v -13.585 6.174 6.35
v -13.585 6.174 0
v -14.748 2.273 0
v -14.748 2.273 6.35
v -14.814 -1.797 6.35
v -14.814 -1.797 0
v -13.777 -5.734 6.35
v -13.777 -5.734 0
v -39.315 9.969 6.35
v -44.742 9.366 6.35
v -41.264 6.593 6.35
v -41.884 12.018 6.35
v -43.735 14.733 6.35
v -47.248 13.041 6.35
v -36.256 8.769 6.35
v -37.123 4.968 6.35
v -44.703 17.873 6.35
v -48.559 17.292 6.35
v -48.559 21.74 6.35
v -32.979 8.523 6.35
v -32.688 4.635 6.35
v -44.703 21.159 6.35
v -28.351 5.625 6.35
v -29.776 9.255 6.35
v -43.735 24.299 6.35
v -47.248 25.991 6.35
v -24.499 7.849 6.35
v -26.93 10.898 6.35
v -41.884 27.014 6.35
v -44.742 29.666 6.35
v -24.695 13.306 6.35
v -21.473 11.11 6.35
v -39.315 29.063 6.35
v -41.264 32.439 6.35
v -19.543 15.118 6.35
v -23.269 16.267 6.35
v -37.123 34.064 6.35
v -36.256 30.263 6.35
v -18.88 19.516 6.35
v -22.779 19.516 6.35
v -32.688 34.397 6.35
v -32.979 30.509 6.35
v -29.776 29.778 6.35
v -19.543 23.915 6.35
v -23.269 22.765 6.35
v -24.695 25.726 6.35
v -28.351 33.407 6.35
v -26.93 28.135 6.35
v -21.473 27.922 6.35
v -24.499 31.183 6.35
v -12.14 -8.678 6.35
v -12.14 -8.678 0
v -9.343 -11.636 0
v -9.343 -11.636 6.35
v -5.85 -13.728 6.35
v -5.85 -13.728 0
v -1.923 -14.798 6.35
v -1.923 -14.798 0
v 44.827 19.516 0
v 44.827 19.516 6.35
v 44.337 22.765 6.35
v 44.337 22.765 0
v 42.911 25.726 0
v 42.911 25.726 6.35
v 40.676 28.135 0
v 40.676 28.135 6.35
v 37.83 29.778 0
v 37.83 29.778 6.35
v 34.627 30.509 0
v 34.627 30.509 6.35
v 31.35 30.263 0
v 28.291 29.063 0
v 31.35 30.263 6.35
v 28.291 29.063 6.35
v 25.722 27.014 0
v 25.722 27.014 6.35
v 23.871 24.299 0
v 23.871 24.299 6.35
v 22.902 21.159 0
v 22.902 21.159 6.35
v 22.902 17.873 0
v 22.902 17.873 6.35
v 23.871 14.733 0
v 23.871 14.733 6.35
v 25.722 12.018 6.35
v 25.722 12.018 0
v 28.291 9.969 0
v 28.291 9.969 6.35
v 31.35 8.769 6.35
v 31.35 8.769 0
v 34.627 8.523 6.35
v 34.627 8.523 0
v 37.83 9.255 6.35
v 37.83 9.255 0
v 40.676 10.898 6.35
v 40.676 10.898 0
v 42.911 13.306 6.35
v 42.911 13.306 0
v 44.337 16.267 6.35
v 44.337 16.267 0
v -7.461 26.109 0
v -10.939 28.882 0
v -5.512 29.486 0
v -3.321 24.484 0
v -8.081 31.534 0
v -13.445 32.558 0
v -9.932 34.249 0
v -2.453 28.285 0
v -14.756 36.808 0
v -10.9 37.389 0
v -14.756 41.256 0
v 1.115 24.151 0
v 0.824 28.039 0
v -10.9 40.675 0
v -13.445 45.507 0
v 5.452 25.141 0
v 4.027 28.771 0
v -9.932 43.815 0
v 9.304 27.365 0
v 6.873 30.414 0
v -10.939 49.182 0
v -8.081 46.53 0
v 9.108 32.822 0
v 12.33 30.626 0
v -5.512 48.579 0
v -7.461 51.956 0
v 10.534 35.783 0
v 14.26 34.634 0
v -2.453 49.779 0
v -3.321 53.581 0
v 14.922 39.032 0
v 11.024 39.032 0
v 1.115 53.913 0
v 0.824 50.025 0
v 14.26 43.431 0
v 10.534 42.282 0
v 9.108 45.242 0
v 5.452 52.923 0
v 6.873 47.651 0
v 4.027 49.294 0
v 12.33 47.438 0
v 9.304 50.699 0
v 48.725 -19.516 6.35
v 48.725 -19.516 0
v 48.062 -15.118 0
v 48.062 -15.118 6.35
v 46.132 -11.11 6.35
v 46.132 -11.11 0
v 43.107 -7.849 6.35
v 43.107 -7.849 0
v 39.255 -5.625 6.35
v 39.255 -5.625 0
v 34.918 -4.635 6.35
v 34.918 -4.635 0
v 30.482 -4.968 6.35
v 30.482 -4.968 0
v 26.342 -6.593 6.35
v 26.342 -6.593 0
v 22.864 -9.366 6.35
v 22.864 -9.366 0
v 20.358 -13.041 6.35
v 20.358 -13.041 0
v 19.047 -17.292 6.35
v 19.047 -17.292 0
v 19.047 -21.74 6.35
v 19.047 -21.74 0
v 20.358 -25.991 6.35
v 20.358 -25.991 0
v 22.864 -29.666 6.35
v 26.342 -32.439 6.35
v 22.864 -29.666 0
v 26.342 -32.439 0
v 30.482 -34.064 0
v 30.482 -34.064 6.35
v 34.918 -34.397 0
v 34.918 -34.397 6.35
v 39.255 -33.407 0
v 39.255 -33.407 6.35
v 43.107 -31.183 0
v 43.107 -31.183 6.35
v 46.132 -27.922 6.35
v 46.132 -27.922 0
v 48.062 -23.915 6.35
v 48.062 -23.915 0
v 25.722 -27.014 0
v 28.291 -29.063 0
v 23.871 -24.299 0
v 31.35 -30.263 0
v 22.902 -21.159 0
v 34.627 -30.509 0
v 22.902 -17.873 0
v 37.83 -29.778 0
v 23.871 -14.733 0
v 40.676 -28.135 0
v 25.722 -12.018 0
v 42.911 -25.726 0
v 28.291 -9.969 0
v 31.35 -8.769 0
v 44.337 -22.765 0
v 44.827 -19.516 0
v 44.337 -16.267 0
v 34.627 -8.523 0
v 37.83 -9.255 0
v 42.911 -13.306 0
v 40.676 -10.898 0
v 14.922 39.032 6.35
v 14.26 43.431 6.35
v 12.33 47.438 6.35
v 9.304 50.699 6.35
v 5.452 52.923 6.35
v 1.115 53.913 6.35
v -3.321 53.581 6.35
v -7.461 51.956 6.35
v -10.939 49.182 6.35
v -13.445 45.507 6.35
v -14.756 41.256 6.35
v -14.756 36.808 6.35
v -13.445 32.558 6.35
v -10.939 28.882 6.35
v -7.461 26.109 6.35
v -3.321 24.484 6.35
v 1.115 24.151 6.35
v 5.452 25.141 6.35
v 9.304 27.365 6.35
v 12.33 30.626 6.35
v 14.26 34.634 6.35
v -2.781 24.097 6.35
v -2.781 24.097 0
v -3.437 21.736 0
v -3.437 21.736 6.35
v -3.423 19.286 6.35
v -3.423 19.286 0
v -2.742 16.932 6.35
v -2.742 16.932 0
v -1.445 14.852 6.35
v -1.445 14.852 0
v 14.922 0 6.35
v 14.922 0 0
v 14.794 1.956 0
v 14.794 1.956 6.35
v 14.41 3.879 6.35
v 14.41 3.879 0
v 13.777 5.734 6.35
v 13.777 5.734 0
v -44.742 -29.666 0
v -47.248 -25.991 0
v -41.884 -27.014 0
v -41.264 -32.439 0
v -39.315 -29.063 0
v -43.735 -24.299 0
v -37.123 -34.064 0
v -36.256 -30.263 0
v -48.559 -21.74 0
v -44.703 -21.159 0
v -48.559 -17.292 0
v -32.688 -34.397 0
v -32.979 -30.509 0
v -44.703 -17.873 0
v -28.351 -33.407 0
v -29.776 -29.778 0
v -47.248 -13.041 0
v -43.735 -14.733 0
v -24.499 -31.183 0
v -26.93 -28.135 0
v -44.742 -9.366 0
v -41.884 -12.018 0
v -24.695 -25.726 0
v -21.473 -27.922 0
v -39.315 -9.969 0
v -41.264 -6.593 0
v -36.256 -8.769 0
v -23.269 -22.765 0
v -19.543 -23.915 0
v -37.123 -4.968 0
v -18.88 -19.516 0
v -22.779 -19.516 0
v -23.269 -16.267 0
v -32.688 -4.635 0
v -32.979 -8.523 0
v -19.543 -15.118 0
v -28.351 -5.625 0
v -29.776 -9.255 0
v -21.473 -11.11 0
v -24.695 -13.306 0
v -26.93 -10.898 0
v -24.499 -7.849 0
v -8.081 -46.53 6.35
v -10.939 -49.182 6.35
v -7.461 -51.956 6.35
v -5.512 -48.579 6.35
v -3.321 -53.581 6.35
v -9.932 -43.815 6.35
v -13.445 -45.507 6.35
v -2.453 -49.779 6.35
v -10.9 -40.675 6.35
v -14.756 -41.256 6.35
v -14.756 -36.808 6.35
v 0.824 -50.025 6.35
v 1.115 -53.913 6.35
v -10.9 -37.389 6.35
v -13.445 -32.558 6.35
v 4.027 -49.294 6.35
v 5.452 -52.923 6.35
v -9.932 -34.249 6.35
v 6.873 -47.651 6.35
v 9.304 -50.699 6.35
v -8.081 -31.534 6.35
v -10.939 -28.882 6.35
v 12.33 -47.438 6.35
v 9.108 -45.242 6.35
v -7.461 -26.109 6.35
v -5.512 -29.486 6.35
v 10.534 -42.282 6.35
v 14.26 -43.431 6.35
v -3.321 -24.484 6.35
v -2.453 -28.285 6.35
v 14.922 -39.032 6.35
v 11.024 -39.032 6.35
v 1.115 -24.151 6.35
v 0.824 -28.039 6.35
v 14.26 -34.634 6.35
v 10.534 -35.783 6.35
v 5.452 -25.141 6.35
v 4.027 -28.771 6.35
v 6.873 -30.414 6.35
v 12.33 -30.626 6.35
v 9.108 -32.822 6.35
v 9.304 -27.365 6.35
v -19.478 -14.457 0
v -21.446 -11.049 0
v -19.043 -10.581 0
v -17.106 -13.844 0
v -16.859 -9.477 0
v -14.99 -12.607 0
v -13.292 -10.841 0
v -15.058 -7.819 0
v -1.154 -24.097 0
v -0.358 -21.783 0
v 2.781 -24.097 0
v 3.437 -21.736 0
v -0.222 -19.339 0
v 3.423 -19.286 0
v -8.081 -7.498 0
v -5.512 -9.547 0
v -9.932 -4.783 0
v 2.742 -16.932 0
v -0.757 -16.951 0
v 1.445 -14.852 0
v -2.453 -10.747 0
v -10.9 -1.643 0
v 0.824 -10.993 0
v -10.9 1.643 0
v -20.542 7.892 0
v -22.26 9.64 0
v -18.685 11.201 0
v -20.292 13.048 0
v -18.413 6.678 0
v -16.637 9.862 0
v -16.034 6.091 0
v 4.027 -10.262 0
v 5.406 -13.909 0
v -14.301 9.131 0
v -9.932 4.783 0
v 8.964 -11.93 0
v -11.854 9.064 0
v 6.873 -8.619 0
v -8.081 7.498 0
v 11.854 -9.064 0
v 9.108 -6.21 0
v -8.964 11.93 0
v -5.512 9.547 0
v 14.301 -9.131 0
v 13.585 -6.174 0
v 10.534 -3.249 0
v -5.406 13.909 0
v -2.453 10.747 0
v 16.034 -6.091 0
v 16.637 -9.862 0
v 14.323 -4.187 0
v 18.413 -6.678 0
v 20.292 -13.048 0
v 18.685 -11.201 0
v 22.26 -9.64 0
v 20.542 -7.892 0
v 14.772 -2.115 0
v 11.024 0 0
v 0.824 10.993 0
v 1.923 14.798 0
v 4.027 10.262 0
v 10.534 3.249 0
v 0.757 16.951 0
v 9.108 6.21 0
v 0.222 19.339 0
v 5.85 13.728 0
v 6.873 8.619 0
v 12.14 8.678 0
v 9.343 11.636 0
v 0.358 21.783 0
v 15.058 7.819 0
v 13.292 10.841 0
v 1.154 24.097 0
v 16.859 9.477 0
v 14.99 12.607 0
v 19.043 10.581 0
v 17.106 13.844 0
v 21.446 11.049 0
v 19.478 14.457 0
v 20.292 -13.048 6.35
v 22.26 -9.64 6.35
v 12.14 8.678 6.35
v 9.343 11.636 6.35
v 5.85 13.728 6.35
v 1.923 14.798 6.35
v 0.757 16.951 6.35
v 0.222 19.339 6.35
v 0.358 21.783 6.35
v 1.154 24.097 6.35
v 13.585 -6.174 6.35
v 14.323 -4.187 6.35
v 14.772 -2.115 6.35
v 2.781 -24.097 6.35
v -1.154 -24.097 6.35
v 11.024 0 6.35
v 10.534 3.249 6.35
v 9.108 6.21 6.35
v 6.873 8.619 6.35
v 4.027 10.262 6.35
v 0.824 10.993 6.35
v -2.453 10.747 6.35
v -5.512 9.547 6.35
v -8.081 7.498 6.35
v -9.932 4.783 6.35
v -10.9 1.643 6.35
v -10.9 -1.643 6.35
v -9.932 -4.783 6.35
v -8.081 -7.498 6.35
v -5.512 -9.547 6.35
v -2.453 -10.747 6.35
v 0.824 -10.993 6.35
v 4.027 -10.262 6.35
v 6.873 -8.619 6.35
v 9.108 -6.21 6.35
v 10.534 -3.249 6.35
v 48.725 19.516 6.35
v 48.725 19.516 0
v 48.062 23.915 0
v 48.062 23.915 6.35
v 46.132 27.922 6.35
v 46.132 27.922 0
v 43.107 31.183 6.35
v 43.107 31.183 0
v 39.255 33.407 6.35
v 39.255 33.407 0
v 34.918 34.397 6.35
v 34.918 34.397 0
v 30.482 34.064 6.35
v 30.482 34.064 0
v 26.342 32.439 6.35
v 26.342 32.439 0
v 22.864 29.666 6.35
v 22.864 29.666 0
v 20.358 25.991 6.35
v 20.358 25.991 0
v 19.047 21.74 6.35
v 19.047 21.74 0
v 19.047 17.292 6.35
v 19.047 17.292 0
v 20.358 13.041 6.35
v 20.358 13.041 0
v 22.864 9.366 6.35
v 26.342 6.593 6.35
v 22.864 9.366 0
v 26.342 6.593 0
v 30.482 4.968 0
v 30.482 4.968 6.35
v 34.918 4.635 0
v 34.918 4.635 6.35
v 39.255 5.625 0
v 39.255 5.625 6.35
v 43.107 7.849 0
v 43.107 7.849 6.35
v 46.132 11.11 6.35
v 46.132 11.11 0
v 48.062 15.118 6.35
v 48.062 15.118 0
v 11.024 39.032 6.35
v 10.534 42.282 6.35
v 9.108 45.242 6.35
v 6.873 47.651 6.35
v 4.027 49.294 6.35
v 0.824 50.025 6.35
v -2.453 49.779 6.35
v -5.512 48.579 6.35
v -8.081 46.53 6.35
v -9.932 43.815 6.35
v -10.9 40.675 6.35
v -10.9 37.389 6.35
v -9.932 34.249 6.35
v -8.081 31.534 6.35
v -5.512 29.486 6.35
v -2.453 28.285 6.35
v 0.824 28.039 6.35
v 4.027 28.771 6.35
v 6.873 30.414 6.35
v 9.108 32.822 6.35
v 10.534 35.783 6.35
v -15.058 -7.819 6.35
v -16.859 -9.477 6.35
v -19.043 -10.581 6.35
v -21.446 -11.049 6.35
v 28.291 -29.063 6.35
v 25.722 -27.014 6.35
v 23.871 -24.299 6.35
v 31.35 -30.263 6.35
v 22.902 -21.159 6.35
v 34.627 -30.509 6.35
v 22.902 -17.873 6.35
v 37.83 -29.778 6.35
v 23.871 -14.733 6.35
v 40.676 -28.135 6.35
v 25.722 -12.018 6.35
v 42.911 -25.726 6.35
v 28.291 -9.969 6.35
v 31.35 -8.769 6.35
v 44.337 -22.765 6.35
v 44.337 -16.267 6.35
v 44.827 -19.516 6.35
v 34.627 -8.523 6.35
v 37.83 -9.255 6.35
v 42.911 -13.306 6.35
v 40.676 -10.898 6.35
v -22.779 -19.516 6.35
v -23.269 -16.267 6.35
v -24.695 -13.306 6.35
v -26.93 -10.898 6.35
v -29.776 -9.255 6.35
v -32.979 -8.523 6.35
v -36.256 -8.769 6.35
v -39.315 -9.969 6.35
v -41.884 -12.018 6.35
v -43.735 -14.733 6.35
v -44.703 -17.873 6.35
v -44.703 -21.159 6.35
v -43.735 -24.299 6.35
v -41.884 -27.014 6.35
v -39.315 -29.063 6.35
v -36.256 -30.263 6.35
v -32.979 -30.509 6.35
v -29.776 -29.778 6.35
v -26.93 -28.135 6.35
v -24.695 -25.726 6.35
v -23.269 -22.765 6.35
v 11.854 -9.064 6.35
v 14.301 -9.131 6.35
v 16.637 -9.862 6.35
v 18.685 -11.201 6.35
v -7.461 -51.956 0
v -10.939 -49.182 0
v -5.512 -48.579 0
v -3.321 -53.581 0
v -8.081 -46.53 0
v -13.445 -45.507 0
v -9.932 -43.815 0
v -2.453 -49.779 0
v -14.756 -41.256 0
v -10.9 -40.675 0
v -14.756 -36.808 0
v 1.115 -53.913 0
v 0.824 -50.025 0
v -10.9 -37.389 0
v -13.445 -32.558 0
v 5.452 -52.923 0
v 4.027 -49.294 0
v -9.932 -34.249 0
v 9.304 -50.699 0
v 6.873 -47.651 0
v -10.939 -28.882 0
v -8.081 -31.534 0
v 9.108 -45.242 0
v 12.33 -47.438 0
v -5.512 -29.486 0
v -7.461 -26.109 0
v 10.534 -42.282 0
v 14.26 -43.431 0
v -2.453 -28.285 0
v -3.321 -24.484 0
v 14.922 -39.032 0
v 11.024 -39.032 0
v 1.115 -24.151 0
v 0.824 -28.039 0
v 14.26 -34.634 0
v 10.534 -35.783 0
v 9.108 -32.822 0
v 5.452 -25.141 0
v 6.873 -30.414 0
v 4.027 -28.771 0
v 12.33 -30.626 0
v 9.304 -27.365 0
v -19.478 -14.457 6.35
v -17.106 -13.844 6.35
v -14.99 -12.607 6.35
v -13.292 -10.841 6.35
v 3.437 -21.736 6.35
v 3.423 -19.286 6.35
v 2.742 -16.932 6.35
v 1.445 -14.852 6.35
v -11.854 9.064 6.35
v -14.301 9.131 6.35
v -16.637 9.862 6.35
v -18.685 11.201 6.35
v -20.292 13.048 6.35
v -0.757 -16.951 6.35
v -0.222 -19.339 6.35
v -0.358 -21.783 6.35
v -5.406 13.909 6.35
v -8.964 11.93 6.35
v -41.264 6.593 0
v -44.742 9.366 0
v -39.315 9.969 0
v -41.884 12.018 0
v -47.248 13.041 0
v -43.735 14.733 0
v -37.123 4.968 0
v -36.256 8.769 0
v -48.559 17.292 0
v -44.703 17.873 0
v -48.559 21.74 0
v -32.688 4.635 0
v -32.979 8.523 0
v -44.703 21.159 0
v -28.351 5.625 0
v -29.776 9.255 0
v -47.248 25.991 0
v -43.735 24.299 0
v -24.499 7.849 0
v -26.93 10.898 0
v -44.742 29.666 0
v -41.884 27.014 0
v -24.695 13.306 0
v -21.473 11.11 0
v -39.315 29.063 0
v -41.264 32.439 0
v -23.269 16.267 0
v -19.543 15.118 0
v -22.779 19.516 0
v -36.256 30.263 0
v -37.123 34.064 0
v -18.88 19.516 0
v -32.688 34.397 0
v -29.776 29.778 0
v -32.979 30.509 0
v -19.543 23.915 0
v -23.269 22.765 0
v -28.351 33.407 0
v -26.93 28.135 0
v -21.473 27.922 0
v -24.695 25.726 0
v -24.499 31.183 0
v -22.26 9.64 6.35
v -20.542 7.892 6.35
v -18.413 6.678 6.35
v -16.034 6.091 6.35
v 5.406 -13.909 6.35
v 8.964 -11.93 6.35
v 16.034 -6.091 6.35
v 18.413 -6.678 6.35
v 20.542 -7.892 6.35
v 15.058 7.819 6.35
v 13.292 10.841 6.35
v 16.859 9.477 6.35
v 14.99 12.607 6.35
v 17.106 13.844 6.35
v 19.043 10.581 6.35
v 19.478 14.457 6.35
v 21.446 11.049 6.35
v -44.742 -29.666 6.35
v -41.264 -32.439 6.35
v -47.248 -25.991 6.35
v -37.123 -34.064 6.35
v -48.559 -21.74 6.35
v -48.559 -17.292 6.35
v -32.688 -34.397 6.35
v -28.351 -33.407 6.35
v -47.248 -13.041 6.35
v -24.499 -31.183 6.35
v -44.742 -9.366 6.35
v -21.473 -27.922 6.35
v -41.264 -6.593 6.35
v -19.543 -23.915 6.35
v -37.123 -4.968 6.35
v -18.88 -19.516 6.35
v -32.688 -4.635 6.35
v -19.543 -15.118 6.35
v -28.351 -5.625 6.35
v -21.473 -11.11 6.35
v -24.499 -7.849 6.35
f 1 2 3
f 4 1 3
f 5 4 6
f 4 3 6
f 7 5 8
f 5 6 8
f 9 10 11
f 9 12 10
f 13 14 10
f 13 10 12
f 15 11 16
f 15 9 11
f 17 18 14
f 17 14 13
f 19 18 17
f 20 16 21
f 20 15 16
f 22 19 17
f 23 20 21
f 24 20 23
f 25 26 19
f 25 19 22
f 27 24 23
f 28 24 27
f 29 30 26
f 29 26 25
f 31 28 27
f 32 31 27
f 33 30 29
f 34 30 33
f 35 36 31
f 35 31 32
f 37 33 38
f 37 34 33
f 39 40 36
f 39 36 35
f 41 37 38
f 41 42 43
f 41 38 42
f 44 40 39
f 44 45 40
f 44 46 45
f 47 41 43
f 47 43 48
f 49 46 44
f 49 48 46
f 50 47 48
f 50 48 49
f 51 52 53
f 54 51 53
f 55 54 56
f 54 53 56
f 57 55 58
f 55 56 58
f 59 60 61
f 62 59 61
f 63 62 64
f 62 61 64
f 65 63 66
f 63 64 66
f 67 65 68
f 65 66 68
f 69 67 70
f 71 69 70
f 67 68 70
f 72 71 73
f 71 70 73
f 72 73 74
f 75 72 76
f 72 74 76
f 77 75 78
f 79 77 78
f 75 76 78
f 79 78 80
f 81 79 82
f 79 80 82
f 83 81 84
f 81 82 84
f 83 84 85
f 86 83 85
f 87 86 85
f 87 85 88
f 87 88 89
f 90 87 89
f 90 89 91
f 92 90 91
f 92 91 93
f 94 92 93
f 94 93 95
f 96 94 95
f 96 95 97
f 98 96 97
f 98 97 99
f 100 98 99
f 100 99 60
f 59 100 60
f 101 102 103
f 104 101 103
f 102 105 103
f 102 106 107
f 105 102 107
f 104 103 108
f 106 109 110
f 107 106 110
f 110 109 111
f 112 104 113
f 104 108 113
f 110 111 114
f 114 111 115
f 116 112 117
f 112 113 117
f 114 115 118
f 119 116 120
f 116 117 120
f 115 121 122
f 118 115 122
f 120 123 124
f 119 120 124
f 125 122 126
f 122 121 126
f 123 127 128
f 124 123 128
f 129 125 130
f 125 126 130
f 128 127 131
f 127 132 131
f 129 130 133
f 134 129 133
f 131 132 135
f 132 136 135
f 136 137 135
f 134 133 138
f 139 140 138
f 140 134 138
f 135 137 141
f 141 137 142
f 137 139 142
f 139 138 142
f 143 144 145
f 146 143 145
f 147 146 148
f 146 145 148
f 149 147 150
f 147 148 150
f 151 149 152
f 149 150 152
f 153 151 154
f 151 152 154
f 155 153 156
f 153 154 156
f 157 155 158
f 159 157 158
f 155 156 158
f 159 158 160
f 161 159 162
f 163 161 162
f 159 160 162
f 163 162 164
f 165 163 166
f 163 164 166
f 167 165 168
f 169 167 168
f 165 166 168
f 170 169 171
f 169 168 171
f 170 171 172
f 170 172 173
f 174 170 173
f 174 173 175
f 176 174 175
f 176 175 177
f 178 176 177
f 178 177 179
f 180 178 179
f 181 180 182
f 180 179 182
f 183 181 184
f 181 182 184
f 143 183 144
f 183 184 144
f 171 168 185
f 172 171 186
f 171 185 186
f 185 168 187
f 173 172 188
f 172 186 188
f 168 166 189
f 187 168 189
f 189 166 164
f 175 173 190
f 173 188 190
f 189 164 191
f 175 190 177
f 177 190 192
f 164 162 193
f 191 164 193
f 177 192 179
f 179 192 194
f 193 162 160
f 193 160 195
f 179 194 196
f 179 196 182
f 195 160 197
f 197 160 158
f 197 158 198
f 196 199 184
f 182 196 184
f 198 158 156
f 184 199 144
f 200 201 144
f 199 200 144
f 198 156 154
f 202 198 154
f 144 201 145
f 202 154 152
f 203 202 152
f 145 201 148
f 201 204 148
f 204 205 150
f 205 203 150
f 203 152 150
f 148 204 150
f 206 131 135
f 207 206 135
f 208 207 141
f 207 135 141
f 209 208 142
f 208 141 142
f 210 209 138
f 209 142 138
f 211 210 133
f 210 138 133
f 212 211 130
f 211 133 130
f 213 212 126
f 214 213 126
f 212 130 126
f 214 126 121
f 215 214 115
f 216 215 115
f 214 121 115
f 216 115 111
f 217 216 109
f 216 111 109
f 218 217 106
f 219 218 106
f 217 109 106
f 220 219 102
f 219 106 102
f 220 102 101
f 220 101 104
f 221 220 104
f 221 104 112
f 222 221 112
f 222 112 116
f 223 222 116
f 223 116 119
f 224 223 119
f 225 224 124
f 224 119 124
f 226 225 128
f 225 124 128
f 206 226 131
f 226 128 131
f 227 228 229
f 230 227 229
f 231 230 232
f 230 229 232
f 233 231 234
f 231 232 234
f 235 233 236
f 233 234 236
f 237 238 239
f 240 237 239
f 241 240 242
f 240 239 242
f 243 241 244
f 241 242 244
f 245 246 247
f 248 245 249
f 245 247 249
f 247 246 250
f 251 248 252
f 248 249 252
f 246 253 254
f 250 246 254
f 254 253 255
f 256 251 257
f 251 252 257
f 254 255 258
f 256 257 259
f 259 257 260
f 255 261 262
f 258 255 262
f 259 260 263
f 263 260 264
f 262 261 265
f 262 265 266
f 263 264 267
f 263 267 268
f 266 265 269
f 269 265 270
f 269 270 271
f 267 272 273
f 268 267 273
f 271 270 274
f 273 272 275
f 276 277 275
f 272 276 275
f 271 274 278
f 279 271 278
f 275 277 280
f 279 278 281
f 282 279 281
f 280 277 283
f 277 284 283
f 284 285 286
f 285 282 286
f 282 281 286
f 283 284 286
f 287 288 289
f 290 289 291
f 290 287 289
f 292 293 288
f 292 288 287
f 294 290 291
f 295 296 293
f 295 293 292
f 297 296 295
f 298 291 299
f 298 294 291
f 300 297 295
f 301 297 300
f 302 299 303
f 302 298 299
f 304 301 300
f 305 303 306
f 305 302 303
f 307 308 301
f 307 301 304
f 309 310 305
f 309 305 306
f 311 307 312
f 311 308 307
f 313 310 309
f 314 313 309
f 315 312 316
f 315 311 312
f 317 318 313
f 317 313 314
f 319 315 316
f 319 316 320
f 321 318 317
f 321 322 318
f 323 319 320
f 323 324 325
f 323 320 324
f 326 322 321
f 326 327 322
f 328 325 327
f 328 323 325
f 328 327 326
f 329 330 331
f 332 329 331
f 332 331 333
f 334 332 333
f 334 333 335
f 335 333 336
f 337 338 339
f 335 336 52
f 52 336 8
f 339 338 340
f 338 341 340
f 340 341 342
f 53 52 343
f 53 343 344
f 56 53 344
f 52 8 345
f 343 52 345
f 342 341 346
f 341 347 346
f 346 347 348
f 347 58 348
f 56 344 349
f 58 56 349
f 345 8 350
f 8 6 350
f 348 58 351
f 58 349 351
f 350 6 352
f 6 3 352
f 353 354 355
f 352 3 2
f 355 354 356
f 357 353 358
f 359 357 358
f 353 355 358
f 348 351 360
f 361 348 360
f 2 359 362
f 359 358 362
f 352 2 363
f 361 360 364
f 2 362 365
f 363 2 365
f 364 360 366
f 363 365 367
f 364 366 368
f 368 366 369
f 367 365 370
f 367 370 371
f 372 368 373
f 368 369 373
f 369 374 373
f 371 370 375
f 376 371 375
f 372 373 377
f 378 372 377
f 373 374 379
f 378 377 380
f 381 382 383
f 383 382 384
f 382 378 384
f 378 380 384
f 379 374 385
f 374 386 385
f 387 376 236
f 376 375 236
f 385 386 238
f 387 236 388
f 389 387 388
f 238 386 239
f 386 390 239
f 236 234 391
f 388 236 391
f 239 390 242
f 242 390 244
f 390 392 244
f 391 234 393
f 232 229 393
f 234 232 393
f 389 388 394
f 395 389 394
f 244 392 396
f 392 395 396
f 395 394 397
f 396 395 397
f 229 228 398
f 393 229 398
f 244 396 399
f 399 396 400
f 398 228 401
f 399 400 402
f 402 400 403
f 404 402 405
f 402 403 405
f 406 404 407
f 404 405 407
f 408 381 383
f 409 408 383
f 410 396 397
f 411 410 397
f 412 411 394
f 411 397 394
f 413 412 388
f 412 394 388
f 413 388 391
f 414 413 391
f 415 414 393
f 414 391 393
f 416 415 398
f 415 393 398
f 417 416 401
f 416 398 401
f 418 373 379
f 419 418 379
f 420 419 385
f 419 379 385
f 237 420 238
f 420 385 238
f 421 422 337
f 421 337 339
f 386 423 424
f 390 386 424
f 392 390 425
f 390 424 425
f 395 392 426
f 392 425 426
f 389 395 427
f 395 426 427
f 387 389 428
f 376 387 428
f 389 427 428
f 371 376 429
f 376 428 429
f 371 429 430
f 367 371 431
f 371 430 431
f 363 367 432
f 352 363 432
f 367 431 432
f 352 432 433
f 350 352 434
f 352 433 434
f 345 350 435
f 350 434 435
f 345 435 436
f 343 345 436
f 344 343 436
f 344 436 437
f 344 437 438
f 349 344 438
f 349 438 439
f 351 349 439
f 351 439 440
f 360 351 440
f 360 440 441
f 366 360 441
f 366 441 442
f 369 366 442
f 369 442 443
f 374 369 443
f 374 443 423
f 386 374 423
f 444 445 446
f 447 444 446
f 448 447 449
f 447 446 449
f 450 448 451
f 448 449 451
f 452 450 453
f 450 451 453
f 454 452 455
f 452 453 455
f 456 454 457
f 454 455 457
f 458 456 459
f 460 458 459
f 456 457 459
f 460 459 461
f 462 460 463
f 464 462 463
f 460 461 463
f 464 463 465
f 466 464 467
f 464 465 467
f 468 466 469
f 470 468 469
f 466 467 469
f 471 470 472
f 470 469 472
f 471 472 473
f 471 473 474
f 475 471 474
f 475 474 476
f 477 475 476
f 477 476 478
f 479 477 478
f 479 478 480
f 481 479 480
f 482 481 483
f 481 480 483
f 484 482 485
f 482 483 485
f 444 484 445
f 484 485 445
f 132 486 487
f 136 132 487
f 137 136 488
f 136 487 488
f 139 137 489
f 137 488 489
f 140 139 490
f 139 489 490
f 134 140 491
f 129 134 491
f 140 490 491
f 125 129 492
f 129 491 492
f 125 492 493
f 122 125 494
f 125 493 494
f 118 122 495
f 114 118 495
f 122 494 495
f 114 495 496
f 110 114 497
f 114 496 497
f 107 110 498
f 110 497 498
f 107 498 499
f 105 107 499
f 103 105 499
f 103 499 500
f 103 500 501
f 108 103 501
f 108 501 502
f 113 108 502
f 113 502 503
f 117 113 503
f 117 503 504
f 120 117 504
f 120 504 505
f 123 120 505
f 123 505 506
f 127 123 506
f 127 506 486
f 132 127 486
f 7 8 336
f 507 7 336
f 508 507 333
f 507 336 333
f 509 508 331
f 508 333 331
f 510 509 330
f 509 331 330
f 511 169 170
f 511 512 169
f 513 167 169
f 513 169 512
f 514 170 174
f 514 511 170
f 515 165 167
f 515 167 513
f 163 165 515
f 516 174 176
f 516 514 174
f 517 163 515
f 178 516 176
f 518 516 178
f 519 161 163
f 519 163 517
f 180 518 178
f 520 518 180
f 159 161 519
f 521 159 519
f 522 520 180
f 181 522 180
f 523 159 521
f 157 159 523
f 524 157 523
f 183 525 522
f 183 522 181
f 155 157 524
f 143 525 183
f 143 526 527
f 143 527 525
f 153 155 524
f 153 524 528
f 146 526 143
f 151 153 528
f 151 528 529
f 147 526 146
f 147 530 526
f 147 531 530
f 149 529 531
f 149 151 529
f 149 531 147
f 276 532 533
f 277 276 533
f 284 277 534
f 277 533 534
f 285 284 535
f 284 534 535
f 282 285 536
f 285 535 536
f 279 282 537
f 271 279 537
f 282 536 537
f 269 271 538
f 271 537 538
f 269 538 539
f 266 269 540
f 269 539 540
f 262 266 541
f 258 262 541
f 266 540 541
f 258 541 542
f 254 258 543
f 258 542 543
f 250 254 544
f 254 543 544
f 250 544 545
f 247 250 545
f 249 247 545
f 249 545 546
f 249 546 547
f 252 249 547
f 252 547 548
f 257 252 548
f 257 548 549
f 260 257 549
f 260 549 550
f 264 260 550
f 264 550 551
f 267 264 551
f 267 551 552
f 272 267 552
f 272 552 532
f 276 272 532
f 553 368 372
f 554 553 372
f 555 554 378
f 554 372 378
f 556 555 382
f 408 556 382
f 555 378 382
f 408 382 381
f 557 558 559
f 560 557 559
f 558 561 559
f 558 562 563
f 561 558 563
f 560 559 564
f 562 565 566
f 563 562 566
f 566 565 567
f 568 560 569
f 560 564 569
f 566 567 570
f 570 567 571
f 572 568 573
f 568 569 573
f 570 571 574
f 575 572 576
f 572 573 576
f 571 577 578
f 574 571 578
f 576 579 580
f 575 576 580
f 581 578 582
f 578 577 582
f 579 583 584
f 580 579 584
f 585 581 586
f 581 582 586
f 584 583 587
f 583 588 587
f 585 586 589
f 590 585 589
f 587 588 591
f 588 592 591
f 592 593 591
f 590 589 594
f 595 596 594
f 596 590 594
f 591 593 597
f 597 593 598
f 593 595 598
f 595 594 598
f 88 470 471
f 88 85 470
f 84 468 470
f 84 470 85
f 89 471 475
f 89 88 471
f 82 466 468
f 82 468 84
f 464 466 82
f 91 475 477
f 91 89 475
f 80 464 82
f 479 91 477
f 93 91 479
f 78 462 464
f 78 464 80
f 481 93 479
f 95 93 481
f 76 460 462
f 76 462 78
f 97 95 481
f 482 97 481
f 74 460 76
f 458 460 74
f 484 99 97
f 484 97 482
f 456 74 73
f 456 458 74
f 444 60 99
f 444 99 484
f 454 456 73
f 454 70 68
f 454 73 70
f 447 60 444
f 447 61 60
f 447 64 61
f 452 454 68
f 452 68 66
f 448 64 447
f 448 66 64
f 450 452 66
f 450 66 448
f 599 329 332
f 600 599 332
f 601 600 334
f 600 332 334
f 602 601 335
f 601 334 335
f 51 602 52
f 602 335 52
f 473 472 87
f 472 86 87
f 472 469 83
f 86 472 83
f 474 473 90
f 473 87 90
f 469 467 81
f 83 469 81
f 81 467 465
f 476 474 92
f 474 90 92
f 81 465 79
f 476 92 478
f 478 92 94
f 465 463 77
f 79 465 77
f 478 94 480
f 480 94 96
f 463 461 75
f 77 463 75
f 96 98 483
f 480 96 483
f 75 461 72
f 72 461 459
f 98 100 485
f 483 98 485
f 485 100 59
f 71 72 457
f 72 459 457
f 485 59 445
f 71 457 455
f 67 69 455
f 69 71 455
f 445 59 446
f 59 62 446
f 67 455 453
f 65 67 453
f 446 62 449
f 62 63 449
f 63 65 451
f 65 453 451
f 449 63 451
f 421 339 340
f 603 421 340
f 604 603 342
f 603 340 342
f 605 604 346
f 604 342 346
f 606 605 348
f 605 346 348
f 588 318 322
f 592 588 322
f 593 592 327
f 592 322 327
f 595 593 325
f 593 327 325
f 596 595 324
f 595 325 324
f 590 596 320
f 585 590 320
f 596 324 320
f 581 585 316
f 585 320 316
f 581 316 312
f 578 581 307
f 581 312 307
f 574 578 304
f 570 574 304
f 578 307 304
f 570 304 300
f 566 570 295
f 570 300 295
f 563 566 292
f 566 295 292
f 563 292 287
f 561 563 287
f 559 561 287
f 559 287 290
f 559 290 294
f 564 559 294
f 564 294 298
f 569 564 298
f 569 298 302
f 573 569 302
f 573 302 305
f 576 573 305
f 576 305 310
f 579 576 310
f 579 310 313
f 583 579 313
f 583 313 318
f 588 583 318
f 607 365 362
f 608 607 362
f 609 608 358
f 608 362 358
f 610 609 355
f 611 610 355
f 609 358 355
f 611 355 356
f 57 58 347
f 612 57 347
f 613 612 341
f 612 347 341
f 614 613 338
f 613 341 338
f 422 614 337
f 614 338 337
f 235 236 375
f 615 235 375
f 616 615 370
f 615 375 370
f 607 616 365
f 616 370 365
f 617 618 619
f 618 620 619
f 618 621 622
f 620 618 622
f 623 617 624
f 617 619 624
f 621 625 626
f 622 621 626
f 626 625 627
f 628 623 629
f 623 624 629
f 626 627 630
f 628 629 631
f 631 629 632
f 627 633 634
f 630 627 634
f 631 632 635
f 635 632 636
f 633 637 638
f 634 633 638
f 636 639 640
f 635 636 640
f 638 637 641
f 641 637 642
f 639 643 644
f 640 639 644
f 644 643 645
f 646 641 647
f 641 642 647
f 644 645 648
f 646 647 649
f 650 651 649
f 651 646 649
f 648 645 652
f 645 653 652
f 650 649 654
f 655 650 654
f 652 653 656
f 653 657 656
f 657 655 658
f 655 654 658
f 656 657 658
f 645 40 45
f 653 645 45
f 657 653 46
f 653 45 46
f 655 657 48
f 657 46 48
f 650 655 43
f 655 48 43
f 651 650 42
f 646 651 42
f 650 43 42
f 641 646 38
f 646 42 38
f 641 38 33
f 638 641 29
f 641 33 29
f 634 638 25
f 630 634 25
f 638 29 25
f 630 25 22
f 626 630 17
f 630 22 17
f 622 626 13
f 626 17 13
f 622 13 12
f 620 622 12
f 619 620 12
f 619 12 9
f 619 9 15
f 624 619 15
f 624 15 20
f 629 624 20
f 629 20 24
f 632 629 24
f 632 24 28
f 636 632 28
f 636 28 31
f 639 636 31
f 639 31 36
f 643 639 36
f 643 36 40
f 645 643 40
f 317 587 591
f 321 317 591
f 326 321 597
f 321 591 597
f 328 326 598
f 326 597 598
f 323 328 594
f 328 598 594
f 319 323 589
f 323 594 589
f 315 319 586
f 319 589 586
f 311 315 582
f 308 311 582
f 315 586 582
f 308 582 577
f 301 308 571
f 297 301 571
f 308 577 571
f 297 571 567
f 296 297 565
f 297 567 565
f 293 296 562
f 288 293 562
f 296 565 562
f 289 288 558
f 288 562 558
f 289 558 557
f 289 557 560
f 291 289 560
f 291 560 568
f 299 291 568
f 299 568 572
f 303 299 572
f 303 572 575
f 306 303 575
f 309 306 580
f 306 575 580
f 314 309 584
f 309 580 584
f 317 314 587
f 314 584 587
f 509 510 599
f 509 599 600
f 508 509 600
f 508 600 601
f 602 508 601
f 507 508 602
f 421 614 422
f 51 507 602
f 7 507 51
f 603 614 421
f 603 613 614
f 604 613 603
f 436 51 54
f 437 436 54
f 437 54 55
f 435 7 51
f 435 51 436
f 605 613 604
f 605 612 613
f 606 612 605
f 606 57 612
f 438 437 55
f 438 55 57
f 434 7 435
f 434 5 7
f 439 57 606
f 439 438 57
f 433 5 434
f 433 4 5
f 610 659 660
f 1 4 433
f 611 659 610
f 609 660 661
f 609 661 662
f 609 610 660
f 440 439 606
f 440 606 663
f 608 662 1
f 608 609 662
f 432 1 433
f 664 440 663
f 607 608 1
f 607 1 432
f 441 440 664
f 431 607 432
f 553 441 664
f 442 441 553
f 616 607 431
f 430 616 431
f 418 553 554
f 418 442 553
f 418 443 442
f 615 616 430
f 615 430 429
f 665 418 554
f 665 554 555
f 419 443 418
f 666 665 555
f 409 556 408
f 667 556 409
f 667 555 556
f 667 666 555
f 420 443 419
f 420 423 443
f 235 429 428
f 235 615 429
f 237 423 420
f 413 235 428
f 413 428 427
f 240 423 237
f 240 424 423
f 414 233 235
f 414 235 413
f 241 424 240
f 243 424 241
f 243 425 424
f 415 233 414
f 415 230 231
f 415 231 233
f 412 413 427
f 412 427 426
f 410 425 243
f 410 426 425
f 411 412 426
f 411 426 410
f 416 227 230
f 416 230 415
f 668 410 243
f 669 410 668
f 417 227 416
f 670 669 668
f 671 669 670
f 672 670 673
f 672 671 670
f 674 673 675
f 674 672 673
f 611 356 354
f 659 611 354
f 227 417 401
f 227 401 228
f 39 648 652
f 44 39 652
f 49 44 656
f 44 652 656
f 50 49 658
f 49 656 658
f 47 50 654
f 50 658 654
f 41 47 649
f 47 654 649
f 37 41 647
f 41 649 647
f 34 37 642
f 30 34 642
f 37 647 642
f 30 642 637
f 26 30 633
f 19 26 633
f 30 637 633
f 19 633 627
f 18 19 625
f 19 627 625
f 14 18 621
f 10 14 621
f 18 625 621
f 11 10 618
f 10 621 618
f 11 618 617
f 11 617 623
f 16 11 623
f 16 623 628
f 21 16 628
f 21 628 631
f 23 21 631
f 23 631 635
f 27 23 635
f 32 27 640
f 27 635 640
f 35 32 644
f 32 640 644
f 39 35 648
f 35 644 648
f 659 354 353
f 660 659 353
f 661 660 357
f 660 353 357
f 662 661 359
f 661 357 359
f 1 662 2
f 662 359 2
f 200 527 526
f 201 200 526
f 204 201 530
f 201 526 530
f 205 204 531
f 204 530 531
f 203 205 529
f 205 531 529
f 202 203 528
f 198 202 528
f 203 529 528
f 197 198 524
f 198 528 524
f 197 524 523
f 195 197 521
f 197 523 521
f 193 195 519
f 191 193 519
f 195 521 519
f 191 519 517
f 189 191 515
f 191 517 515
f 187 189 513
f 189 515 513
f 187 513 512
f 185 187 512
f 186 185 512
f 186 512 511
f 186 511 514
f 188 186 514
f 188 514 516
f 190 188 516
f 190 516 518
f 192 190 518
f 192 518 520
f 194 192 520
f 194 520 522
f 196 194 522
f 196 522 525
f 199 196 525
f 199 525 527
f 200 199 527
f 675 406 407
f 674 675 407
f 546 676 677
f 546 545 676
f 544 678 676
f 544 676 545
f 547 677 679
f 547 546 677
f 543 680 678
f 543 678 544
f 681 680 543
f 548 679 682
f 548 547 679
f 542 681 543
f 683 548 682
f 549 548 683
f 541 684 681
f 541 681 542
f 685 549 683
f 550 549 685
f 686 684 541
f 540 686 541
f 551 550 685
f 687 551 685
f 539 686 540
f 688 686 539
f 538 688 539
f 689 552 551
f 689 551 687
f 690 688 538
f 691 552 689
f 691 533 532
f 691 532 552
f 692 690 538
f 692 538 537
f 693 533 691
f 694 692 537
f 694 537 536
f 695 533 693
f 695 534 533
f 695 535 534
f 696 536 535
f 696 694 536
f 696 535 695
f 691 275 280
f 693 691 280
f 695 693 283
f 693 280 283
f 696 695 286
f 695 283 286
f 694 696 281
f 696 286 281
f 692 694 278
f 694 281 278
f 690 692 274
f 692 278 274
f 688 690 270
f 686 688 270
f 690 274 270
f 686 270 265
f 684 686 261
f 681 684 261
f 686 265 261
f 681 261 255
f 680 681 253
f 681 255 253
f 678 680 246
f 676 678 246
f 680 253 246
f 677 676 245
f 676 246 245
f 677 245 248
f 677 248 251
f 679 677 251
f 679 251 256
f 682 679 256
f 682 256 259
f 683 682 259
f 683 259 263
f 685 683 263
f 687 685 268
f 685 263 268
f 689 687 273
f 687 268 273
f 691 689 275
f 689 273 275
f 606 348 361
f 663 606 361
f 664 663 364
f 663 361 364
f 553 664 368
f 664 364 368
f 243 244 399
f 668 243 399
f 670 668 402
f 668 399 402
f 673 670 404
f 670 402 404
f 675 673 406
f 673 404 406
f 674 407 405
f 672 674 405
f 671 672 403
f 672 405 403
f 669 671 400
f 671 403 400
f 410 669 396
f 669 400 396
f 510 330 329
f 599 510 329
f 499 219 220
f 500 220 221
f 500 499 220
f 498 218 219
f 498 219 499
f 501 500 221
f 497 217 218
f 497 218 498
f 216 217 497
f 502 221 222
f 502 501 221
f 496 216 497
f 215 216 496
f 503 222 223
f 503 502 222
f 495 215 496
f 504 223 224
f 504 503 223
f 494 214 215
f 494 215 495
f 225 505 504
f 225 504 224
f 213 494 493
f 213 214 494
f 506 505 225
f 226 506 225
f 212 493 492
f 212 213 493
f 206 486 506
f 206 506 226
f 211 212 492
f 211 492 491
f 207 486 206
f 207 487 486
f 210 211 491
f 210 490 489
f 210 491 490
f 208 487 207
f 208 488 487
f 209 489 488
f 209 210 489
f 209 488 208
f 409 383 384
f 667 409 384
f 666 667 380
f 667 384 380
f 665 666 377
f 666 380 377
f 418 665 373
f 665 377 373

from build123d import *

# Parameters (mm, degrees)
F1_DEPTH  = 6.35
F0_R      = 14.9225
F2_R      = 11.0236
F3_DEPTH  = 25.4
F4_R      = 11.0236
F9_DEPTH  = 25.4
F5_R      = 11.0236
F10_DEPTH = 25.4
F6_R      = 11.0236
F11_DEPTH = 25.4
F7_R      = 11.0236
F12_DEPTH = 25.4
F8_R      = 11.0236
F13_DEPTH = 25.4
F14_R     = 11.0236
F15_DEPTH = 25.4


with BuildPart() as f1:
    # F0 (on Top) → F1 (new body)
    with BuildSketch(Plane.XY):
        with BuildLine():
            ThreePointArc((13.5851728598, -6.1744703917), (14.5843366022, -3.1588181531), (14.9225, 0))
            ThreePointArc((14.9225, 0), (14.6332768111, 2.9237332336), (13.7768185095, 5.7341327162))
            ThreePointArc((13.7768185095, 5.7341327162), (13.0416496044, 7.2523363026), (12.1398346441, 8.6778696156))
            ThreePointArc((12.1398346441, 8.6778696156), (7.6682317133, 12.8015322771), (1.9225046539, 14.7981411706))
            Line((1.9225046539, 14.7981411706), (-1.4453382158, 14.8523400073))
            ThreePointArc((-1.4453382158, 14.8523400073), (-7.2523363026, 13.0416496044), (-11.8543138556, 9.0640084545))
            ThreePointArc((-11.8543138556, 9.0640084545), (-12.8015322771, 7.6682317133), (-13.5851728598, 6.1744703917))
            ThreePointArc((-13.5851728598, 6.1744703917), (-14.920568016, 0.2401173273), (-13.7768185095, -5.7341327162))
            ThreePointArc((-13.7768185095, -5.7341327162), (-13.0416496044, -7.2523363026), (-12.1398346441, -8.6778696156))
            ThreePointArc((-12.1398346441, -8.6778696156), (-7.6682317133, -12.8015322771), (-1.9225046539, -14.7981411706))
            ThreePointArc((-1.9225046539, -14.7981411706), (-0.2401173273, -14.920568016), (1.4453382158, -14.8523400073))
            ThreePointArc((1.4453382158, -14.8523400073), (7.2523363026, -13.0416496044), (11.8543138556, -9.0640084545))
            ThreePointArc((11.8543138556, -9.0640084545), (12.8015322771, -7.6682317133), (13.5851728598, -6.1744703917))
        make_face()
        with BuildLine():
            ThreePointArc((12.1398346441, 8.6778696156), (13.0416496044, 7.2523363026), (13.7768185095, 5.7341327162))
            ThreePointArc((13.7768185095, 5.7341327162), (16.8591903149, 9.4769405192), (21.4457825511, 11.0494537487))
            Line((21.4457825511, 11.0494537487), (19.4782146588, 14.4573813055))
            ThreePointArc((19.4782146588, 14.4573813055), (14.9901897235, 12.6073191567), (12.1398346441, 8.6778696156))
        make_face()
        with BuildLine():
            ThreePointArc((22.2595668121, -9.6399380622), (18.413353525, -6.6782255297), (13.5851728598, -6.1744703917))
            ThreePointArc((13.5851728598, -6.1744703917), (12.8015322771, -7.6682317133), (11.8543138556, -9.0640084545))
            ThreePointArc((11.8543138556, -9.0640084545), (16.6368663973, -9.8620168404), (20.2919989199, -13.047865619))
            Line((20.2919989199, -13.047865619), (22.2595668121, -9.6399380622))
        make_face()
        with BuildLine():
            Line((-1.4453382158, 14.8523400073), (1.9225046539, 14.7981411706))
            ThreePointArc((1.9225046539, 14.7981411706), (0.2401173273, 14.920568016), (-1.4453382158, 14.8523400073))
        make_face()
        with BuildLine():
            ThreePointArc((-1.4453382158, 14.8523400073), (0.2401173273, 14.920568016), (1.9225046539, 14.7981411706))
            ThreePointArc((1.9225046539, 14.7981411706), (0.2223239177, 19.3389573596), (1.1537836313, 24.0973193676))
            Line((1.1537836313, 24.0973193676), (-2.7813521533, 24.0973193676))
            ThreePointArc((-2.7813521533, 24.0973193676), (-3.4231638016, 19.2855446864), (-1.4453382158, 14.8523400073))
        make_face()
        with BuildLine():
            ThreePointArc((2.7813521533, -24.0973193676), (3.4231638016, -19.2855446864), (1.4453382158, -14.8523400073))
            ThreePointArc((1.4453382158, -14.8523400073), (-0.2401173273, -14.920568016), (-1.9225046539, -14.7981411706))
            ThreePointArc((-1.9225046539, -14.7981411706), (-0.2223239177, -19.3389573596), (-1.1537836313, -24.0973193676))
            Line((-1.1537836313, -24.0973193676), (2.7813521533, -24.0973193676))
        make_face()
        with BuildLine():
            ThreePointArc((-13.5851728598, 6.1744703917), (-12.8015322771, 7.6682317133), (-11.8543138556, 9.0640084545))
            ThreePointArc((-11.8543138556, 9.0640084545), (-16.6368663973, 9.8620168404), (-20.2919989199, 13.047865619))
            Line((-20.2919989199, 13.047865619), (-22.2595668121, 9.6399380622))
            ThreePointArc((-22.2595668121, 9.6399380622), (-18.413353525, 6.6782255297), (-13.5851728598, 6.1744703917))
        make_face()
        with BuildLine():
            ThreePointArc((-19.4782146588, -14.4573813055), (-14.9901897235, -12.6073191567), (-12.1398346441, -8.6778696156))
            ThreePointArc((-12.1398346441, -8.6778696156), (-13.0416496044, -7.2523363026), (-13.7768185095, -5.7341327162))
            ThreePointArc((-13.7768185095, -5.7341327162), (-16.8591903149, -9.4769405192), (-21.4457825511, -11.0494537487))
            Line((-21.4457825511, -11.0494537487), (-19.4782146588, -14.4573813055))
        make_face()
    extrude(amount=F1_DEPTH)

    # F4 (on face) → F9 (cut)
    with BuildSketch(Plane.XY.offset(6.35)):
        with Locations((0, 39.0322469175)):
            Circle(F4_R)
    extrude(amount=-F9_DEPTH, mode=Mode.SUBTRACT)

    # F5 (on face) → F10 (cut)
    with BuildSketch(Plane.XY.offset(6.35)):
        with Locations((33.8029173973, 19.5161234587)):
            Circle(F5_R)
    extrude(amount=-F10_DEPTH, mode=Mode.SUBTRACT)

    # F6 (on face) → F11 (cut)
    with BuildSketch(Plane.XY.offset(6.35)):
        with Locations((33.8029173973, -19.5161234587)):
            Circle(F6_R)
    extrude(amount=-F11_DEPTH, mode=Mode.SUBTRACT)

    # F7 (on face) → F12 (cut)
    with BuildSketch(Plane.XY.offset(6.35)):
        with Locations((0, -39.0322469175)):
            Circle(F7_R)
    extrude(amount=-F12_DEPTH, mode=Mode.SUBTRACT)

    # F8 (on face) → F13 (cut)
    with BuildSketch(Plane.XY.offset(6.35)):
        with Locations((-33.8029173973, -19.5161234587)):
            Circle(F8_R)
    extrude(amount=-F13_DEPTH, mode=Mode.SUBTRACT)

    # F14 (on face) → F15 (cut)
    with BuildSketch(Plane.XY.offset(6.35)):
        Circle(F14_R)
    extrude(amount=-F15_DEPTH, mode=Mode.SUBTRACT)


with BuildPart() as f1b:
    # F0 (on Top) → F1, piece 2 (new body)
    with BuildSketch(Plane.XY):
        with Locations((0, 39.0322469175)):
            Circle(F0_R)
    extrude(amount=F1_DEPTH)


with BuildPart() as f1c:
    # F0 (on Top) → F1, piece 3 (new body)
    with BuildSketch(Plane.XY):
        with Locations((-33.8029173973, 19.5161234587)):
            Circle(F0_R)
    extrude(amount=F1_DEPTH)


with BuildPart() as f1d:
    # F0 (on Top) → F1, piece 4 (new body)
    with BuildSketch(Plane.XY):
        with Locations((-33.8029173973, -19.5161234587)):
            Circle(F0_R)
    extrude(amount=F1_DEPTH)


with BuildPart() as f1e:
    # F0 (on Top) → F1, piece 5 (new body)
    with BuildSketch(Plane.XY):
        with Locations((0, -39.0322469175)):
            Circle(F0_R)
    extrude(amount=F1_DEPTH)


with BuildPart() as f1f:
    # F0 (on Top) → F1, piece 6 (new body)
    with BuildSketch(Plane.XY):
        with Locations((33.8029173973, -19.5161234587)):
            Circle(F0_R)
    extrude(amount=F1_DEPTH)


with BuildPart() as f1g:
    # F0 (on Top) → F1, piece 7 (new body)
    with BuildSketch(Plane.XY):
        with Locations((33.8029173973, 19.5161234587)):
            Circle(F0_R)
    extrude(amount=F1_DEPTH)


with BuildPart() as f3_tool:
    # F2 (on face) → F3 (new body)
    with BuildSketch(Plane.XY.offset(6.35)):
        with Locations((-33.8029173973, 19.5161234587)):
            Circle(F2_R)
        with Locations((0, 39.0322469175)):
            Circle(F2_R)
        with Locations((33.8029173973, 19.5161234587)):
            Circle(F2_R)
        with Locations((33.8029173973, -19.5161234587)):
            Circle(F2_R)
        with Locations((0, -39.0322469175)):
            Circle(F2_R)
        with Locations((-33.8029173973, -19.5161234587)):
            Circle(F2_R)
    extrude(amount=-F3_DEPTH)


with BuildPart() as f1b_1:
    add(f1b.part)

    # F3: cut by f3_tool
    add(f3_tool.part, mode=Mode.SUBTRACT)


with BuildPart() as f1c_1:
    add(f1c.part)

    # F3: cut by f3_tool
    add(f3_tool.part, mode=Mode.SUBTRACT)


with BuildPart() as f1d_1:
    add(f1d.part)

    # F3: cut by f3_tool
    add(f3_tool.part, mode=Mode.SUBTRACT)


with BuildPart() as f1e_1:
    add(f1e.part)

    # F3: cut by f3_tool
    add(f3_tool.part, mode=Mode.SUBTRACT)


with BuildPart() as f1f_1:
    add(f1f.part)

    # F3: cut by f3_tool
    add(f3_tool.part, mode=Mode.SUBTRACT)


with BuildPart() as f1g_1:
    add(f1g.part)

    # F3: cut by f3_tool
    add(f3_tool.part, mode=Mode.SUBTRACT)


solid = Compound([f1.part, f1b_1.part, f1c_1.part, f1d_1.part, f1e_1.part, f1f_1.part, f1g_1.part])
